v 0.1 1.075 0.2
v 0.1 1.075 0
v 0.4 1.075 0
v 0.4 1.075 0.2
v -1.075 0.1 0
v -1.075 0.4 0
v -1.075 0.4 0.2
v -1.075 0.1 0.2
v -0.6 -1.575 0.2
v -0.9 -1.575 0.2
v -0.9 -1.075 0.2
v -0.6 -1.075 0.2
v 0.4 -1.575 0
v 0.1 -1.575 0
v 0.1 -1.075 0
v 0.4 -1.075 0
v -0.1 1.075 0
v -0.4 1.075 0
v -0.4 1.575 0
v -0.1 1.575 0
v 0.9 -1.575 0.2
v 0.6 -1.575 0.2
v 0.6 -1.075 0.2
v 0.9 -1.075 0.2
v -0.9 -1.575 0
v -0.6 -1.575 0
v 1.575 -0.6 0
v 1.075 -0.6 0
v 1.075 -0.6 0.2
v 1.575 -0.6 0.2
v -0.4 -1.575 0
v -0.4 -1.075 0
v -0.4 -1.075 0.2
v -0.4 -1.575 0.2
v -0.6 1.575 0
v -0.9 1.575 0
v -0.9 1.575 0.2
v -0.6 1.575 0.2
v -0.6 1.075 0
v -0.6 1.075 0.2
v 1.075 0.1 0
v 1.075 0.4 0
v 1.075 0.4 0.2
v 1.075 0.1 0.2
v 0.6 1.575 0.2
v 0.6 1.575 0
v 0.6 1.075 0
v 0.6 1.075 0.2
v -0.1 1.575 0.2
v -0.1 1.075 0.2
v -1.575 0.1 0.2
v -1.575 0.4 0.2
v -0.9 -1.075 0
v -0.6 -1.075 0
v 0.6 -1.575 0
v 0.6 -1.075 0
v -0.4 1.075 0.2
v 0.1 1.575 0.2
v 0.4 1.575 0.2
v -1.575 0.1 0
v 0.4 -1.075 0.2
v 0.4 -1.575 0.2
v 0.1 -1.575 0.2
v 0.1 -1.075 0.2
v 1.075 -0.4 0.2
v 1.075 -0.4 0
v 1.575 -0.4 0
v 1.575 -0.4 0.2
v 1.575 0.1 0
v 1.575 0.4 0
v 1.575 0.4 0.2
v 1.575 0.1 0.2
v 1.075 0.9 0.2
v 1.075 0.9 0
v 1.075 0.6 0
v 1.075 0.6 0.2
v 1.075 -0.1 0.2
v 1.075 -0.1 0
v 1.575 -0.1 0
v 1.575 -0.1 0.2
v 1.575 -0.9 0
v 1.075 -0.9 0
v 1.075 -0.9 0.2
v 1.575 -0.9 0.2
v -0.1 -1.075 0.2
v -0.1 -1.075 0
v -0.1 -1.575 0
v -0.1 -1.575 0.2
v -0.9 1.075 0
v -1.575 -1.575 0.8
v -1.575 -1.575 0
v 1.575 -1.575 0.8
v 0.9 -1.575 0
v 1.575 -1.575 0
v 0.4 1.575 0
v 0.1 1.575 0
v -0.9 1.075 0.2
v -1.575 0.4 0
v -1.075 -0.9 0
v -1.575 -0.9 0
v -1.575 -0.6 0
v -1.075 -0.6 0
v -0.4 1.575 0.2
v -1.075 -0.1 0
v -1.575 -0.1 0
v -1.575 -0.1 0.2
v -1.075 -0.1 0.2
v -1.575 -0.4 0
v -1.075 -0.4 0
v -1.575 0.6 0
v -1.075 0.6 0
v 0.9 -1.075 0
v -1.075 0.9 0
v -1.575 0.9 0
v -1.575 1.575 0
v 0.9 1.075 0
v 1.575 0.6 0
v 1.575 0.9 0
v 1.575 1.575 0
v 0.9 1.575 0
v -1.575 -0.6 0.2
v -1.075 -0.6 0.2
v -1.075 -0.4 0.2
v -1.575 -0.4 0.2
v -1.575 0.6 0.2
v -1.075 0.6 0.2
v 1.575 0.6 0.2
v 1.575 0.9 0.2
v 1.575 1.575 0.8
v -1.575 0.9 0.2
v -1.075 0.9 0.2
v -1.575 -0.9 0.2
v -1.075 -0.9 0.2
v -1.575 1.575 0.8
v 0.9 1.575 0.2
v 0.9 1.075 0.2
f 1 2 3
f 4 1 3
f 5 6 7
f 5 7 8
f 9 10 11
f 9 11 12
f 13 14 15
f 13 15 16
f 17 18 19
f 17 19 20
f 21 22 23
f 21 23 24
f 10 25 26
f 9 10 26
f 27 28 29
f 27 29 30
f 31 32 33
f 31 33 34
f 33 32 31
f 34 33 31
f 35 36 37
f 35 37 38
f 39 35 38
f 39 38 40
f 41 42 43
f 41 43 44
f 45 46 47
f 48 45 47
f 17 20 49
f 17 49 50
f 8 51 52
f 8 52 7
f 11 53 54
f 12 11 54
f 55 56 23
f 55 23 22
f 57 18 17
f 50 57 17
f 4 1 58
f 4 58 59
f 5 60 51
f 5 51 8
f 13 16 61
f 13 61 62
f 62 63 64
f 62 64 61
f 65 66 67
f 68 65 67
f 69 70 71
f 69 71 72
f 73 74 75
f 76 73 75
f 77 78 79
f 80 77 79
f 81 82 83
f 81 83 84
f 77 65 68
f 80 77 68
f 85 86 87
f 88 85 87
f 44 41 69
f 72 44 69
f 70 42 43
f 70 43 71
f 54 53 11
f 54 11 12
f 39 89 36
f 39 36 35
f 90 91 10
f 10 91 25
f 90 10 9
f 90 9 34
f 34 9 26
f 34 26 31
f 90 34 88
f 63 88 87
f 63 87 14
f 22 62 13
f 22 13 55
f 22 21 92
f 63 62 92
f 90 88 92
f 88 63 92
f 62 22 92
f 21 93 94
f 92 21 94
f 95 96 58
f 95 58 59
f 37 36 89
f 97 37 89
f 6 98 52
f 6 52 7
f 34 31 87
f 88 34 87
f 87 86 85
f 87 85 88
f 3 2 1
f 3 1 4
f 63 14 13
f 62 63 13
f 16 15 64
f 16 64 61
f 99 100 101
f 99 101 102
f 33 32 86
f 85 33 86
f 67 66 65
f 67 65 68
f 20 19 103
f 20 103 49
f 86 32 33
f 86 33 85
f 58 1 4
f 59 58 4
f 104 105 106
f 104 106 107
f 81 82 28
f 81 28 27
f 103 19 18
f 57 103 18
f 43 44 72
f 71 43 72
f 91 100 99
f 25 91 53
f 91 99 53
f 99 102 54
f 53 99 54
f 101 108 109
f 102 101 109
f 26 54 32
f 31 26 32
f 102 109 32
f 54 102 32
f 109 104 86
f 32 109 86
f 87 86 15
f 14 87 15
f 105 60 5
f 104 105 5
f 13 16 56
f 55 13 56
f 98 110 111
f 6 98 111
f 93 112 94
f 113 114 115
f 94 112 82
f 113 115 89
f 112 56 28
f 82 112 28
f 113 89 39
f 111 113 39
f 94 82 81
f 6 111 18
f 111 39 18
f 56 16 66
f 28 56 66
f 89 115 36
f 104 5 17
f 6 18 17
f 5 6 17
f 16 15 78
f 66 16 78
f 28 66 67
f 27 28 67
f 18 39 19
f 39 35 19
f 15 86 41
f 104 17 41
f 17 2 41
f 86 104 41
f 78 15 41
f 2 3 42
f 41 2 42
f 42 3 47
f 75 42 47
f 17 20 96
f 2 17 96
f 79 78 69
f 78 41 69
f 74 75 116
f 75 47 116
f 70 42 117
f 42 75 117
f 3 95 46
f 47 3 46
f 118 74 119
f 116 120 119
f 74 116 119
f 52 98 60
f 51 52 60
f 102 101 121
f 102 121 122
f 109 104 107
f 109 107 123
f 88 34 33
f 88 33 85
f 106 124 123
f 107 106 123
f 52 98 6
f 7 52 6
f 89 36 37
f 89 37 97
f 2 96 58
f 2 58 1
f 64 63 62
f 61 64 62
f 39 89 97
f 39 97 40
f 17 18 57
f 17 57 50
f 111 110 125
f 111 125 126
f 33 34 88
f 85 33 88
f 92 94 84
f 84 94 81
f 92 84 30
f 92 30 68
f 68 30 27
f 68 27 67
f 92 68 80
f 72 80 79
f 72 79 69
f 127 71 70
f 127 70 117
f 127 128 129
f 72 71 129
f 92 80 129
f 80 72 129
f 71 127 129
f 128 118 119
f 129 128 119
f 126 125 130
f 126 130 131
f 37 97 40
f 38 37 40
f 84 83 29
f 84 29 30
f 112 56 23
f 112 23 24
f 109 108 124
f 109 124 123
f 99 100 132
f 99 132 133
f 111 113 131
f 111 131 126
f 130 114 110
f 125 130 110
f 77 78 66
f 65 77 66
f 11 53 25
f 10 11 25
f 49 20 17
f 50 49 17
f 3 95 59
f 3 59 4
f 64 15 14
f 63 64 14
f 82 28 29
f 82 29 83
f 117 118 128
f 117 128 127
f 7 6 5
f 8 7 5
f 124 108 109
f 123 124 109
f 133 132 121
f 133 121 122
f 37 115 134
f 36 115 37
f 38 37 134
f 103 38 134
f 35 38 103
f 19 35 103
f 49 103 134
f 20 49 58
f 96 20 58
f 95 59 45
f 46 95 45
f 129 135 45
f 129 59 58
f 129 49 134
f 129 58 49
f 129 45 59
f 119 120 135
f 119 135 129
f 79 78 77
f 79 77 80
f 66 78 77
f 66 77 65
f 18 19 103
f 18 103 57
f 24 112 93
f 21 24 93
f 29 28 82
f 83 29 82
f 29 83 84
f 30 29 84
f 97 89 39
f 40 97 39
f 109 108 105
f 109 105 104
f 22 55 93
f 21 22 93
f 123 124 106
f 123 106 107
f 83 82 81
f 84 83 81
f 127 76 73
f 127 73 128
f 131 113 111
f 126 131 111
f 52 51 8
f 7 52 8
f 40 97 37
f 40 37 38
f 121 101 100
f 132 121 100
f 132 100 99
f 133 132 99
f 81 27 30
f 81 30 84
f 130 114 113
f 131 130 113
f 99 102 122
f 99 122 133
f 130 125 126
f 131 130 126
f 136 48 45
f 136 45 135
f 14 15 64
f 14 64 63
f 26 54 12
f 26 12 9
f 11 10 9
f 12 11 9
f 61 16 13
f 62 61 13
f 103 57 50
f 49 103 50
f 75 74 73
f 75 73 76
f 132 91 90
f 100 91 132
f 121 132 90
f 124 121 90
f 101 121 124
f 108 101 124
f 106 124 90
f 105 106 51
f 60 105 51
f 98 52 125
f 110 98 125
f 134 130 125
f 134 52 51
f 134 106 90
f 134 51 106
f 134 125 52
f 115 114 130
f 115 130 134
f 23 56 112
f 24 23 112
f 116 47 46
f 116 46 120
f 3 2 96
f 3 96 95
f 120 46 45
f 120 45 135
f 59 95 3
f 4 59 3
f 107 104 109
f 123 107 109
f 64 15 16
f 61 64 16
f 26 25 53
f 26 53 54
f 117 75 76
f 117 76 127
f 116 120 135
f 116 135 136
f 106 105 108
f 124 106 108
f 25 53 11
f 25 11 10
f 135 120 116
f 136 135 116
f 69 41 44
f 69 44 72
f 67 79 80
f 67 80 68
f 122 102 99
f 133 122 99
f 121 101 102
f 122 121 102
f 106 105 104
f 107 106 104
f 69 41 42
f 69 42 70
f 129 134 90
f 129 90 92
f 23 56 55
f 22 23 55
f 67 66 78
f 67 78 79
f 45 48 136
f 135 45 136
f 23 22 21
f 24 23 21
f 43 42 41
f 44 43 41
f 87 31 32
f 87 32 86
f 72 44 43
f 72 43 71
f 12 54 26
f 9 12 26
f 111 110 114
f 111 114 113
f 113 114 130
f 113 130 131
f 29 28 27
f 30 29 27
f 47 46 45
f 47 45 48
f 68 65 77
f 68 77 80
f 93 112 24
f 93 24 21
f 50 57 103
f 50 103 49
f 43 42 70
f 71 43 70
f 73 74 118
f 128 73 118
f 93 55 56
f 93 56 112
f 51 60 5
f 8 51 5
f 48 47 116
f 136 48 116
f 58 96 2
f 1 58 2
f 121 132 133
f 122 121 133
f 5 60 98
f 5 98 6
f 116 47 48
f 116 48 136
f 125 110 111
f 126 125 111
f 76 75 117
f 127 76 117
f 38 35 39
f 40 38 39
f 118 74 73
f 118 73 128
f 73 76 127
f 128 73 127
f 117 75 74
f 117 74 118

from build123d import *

# Parameters (mm, degrees)
F0_W     = 3.15
F0_H     = 3.15
F1_DEPTH = 0.8
F2_W     = 0.3
F2_H     = 0.5
F2_W_2   = 0.5
F2_H_2   = 0.3
F3_DEPTH = 0.2
F4_DEPTH = 0.2


with BuildPart() as f1:
    # F0 (on Top) → F1 (new body)
    with BuildSketch(Plane.XY):
        Rectangle(F0_W, F0_H)
    extrude(amount=F1_DEPTH)

    # F2 (on face) → F3 (cut)
    with BuildSketch(Plane(origin=(0, 0, 0), x_dir=(1, 0, 0), z_dir=(0, 0, -1))):
        with Locations((0.25, 1.325)):
            Rectangle(F2_W, F2_H)
        with Locations((0.75, 1.325)):
            Rectangle(F2_W, F2_H)
        with Locations((-0.25, 1.325)):
            Rectangle(F2_W, F2_H)
        with Locations((-0.75, 1.325)):
            Rectangle(F2_W, F2_H)
        with Locations((-1.325, 0.25)):
            Rectangle(F2_W_2, F2_H_2)
        with Locations((-1.325, 0.75)):
            Rectangle(F2_W_2, F2_H_2)
        with Locations((-1.325, -0.75)):
            Rectangle(F2_W_2, F2_H_2)
        with Locations((-1.325, -0.25)):
            Rectangle(F2_W_2, F2_H_2)
        with Locations((-0.25, -1.325)):
            Rectangle(F2_W, F2_H)
        with Locations((-0.75, -1.325)):
            Rectangle(F2_W, F2_H)
        with Locations((0.75, -1.325)):
            Rectangle(F2_W, F2_H)
        with Locations((0.25, -1.325)):
            Rectangle(F2_W, F2_H)
        with Locations((1.325, -0.25)):
            Rectangle(F2_W_2, F2_H_2)
        with Locations((1.325, -0.75)):
            Rectangle(F2_W_2, F2_H_2)
        with Locations((1.325, 0.75)):
            Rectangle(F2_W_2, F2_H_2)
        with Locations((1.325, 0.25)):
            Rectangle(F2_W_2, F2_H_2)
    extrude(amount=-F3_DEPTH, mode=Mode.SUBTRACT)


with BuildPart() as f4:
    # F2 (on face) → F4 (new body)
    with BuildSketch(Plane(origin=(0, 0, 0), x_dir=(1, 0, 0), z_dir=(0, 0, -1))):
        with Locations((0.25, 1.325)):
            Rectangle(F2_W, F2_H)
        with Locations((0.75, 1.325)):
            Rectangle(F2_W, F2_H)
        with Locations((-0.25, 1.325)):
            Rectangle(F2_W, F2_H)
        with Locations((-0.75, 1.325)):
            Rectangle(F2_W, F2_H)
        with Locations((-1.325, 0.25)):
            Rectangle(F2_W_2, F2_H_2)
        with Locations((-1.325, 0.75)):
            Rectangle(F2_W_2, F2_H_2)
        with Locations((-1.325, -0.75)):
            Rectangle(F2_W_2, F2_H_2)
        with Locations((-1.325, -0.25)):
            Rectangle(F2_W_2, F2_H_2)
        with Locations((-0.25, -1.325)):
            Rectangle(F2_W, F2_H)
        with Locations((-0.75, -1.325)):
            Rectangle(F2_W, F2_H)
        with Locations((0.75, -1.325)):
            Rectangle(F2_W, F2_H)
        with Locations((0.25, -1.325)):
            Rectangle(F2_W, F2_H)
        with Locations((1.325, -0.25)):
            Rectangle(F2_W_2, F2_H_2)
        with Locations((1.325, -0.75)):
            Rectangle(F2_W_2, F2_H_2)
        with Locations((1.325, 0.75)):
            Rectangle(F2_W_2, F2_H_2)
        with Locations((1.325, 0.25)):
            Rectangle(F2_W_2, F2_H_2)
    extrude(amount=-F4_DEPTH)


solid = Compound([f1.part, f4.part])
